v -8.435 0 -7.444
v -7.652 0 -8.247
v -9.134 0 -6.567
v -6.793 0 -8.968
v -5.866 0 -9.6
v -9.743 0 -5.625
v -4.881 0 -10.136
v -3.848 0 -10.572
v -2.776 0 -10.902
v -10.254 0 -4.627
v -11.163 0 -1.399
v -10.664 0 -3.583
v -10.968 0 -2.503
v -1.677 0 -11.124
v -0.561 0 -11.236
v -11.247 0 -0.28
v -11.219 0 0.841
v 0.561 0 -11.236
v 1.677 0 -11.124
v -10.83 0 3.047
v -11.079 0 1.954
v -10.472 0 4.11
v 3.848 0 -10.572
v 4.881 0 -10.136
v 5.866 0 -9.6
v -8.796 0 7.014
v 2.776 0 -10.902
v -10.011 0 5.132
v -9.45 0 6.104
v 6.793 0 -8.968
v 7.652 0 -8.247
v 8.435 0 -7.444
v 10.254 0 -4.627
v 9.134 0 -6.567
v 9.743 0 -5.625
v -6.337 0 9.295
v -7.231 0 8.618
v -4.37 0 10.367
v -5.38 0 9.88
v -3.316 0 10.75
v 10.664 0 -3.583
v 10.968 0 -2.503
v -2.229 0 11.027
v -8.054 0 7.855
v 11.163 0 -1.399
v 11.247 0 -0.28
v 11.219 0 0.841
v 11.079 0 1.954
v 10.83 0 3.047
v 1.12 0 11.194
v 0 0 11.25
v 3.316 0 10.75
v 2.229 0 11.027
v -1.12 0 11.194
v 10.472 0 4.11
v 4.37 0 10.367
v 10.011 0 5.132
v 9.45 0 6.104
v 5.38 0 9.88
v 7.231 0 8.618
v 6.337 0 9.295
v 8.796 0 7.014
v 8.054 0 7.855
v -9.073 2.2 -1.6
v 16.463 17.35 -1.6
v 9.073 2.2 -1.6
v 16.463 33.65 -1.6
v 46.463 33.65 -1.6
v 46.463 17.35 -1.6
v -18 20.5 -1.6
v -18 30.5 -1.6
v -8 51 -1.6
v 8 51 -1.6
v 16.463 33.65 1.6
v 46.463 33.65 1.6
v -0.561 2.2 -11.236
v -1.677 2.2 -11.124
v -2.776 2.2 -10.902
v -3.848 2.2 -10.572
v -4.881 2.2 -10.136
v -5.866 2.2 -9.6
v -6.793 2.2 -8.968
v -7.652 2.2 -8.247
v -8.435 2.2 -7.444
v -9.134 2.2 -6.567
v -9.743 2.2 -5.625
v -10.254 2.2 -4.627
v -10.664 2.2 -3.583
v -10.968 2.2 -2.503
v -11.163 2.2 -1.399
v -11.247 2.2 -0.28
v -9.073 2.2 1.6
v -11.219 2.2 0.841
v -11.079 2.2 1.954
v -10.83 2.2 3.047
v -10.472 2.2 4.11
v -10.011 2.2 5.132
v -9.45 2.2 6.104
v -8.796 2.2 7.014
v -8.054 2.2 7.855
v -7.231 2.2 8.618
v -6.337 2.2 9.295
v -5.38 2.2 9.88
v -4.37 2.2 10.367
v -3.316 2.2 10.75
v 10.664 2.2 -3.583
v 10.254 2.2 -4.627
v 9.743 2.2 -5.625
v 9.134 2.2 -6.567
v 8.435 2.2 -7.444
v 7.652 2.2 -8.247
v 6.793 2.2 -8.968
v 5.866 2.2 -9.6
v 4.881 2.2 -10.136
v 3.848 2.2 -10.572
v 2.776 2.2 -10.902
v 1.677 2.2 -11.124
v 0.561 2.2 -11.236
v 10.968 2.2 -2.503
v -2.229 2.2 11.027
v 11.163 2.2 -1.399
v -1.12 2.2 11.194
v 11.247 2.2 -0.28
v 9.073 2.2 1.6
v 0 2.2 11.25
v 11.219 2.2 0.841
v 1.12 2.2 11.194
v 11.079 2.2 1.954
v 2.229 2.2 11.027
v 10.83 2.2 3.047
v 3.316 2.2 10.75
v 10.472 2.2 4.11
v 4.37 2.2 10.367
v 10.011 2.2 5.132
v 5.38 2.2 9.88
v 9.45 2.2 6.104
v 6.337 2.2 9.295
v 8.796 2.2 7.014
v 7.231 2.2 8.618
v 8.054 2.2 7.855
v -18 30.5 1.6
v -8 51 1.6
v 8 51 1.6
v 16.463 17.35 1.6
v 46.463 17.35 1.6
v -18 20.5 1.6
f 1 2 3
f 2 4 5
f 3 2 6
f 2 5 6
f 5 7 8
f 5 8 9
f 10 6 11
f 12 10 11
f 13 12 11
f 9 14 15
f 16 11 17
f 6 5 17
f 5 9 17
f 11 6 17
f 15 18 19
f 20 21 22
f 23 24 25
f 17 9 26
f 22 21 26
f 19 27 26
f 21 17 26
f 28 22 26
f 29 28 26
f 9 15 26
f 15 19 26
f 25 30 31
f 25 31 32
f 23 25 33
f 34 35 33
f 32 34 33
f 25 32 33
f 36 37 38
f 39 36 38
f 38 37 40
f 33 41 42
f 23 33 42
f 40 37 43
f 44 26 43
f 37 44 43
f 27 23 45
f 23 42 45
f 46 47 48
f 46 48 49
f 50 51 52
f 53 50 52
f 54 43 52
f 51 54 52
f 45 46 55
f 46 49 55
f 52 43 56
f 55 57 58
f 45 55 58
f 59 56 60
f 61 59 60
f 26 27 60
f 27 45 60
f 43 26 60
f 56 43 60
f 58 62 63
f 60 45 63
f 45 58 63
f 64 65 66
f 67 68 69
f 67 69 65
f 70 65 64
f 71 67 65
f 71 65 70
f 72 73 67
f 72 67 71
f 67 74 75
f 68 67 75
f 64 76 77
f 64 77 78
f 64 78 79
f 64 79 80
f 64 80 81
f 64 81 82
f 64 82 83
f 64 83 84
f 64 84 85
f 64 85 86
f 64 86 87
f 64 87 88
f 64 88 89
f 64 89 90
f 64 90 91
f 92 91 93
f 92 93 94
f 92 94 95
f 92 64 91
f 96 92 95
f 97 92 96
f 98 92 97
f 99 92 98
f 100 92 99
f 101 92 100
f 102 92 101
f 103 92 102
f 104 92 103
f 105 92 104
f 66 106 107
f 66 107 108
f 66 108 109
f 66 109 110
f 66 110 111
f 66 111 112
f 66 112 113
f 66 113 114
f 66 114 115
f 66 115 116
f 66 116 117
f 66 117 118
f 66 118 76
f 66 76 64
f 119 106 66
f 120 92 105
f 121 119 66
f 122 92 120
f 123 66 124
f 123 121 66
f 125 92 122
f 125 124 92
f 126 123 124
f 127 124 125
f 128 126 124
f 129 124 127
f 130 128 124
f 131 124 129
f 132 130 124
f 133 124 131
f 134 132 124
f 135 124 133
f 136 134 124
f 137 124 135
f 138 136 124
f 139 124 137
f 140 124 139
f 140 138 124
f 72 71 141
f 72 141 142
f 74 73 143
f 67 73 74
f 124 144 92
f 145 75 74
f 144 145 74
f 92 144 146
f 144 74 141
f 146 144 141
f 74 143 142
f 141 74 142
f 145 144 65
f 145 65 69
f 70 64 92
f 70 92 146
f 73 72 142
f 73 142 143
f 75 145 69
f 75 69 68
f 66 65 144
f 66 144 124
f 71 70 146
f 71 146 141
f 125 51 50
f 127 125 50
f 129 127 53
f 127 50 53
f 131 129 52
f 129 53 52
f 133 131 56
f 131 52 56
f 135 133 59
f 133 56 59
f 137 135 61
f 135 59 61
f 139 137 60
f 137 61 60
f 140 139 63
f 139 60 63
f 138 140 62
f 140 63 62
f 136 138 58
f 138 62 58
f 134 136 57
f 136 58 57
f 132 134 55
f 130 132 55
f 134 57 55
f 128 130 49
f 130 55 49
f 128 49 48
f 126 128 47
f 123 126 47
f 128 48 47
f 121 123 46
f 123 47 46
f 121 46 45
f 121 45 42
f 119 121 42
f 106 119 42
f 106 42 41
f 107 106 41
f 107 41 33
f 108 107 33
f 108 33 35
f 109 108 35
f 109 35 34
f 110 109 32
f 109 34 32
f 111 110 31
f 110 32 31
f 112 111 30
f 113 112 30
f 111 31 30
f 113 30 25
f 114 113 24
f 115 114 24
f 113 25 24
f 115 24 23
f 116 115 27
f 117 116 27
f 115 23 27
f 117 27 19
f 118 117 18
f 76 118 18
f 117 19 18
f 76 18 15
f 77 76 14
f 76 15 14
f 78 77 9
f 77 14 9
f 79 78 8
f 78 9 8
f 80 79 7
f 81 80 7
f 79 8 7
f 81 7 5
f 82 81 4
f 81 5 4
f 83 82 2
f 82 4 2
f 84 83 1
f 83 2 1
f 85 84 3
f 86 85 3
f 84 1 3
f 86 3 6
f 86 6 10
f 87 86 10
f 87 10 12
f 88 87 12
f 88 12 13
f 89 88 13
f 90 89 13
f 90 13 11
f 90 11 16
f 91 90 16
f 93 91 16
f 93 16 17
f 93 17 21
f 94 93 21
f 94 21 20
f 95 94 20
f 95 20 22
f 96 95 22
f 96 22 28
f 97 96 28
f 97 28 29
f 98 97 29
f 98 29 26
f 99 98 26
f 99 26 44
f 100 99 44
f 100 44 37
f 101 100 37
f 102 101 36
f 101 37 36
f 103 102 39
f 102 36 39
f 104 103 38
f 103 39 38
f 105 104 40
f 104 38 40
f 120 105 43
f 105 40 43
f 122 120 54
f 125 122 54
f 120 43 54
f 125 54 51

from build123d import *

# Parameters (mm, degrees)
SKETCH1_R                = 11.25
BOSS_EXTRUDE1_DEPTH      = 2.2
BOSS_EXTRUDE2_DEPTH      = 1.6
BOSS_EXTRUDE2_DEPTH_BACK = 1.6
SKETCH3_W                = 33.32922231
SKETCH3_H                = 16.3
BOSS_EXTRUDE3_DEPTH      = 3.2


with BuildPart() as part:
    # Sketch1 → Boss-Extrude1 (new body)
    with BuildSketch(Plane(origin=(0, 0, 0), x_dir=(1, 0, 0), z_dir=(0, 1, 0))):
        Circle(SKETCH1_R)
    extrude(amount=BOSS_EXTRUDE1_DEPTH)

    # Sketch2 → Boss-Extrude2 (add, two sides: drawn at the far end of the back side and taken through both)
    with BuildSketch(Plane.XY.offset(-BOSS_EXTRUDE2_DEPTH_BACK)):
        Polygon((-8, 51), (8, 51), (18, 30.5), (18, 20.5), (8, 0), (-8, 0), (-18, 20.5), (-18, 30.5), align=None)
    extrude(amount=BOSS_EXTRUDE2_DEPTH + BOSS_EXTRUDE2_DEPTH_BACK)

    # Sketch3 → Boss-Extrude3 (add)
    with BuildSketch(Plane.XY.offset(1.6)):
        with Locations((29.798803479, 25.5)):
            Rectangle(SKETCH3_W, SKETCH3_H)
    extrude(amount=-BOSS_EXTRUDE3_DEPTH)


solid = part.part
